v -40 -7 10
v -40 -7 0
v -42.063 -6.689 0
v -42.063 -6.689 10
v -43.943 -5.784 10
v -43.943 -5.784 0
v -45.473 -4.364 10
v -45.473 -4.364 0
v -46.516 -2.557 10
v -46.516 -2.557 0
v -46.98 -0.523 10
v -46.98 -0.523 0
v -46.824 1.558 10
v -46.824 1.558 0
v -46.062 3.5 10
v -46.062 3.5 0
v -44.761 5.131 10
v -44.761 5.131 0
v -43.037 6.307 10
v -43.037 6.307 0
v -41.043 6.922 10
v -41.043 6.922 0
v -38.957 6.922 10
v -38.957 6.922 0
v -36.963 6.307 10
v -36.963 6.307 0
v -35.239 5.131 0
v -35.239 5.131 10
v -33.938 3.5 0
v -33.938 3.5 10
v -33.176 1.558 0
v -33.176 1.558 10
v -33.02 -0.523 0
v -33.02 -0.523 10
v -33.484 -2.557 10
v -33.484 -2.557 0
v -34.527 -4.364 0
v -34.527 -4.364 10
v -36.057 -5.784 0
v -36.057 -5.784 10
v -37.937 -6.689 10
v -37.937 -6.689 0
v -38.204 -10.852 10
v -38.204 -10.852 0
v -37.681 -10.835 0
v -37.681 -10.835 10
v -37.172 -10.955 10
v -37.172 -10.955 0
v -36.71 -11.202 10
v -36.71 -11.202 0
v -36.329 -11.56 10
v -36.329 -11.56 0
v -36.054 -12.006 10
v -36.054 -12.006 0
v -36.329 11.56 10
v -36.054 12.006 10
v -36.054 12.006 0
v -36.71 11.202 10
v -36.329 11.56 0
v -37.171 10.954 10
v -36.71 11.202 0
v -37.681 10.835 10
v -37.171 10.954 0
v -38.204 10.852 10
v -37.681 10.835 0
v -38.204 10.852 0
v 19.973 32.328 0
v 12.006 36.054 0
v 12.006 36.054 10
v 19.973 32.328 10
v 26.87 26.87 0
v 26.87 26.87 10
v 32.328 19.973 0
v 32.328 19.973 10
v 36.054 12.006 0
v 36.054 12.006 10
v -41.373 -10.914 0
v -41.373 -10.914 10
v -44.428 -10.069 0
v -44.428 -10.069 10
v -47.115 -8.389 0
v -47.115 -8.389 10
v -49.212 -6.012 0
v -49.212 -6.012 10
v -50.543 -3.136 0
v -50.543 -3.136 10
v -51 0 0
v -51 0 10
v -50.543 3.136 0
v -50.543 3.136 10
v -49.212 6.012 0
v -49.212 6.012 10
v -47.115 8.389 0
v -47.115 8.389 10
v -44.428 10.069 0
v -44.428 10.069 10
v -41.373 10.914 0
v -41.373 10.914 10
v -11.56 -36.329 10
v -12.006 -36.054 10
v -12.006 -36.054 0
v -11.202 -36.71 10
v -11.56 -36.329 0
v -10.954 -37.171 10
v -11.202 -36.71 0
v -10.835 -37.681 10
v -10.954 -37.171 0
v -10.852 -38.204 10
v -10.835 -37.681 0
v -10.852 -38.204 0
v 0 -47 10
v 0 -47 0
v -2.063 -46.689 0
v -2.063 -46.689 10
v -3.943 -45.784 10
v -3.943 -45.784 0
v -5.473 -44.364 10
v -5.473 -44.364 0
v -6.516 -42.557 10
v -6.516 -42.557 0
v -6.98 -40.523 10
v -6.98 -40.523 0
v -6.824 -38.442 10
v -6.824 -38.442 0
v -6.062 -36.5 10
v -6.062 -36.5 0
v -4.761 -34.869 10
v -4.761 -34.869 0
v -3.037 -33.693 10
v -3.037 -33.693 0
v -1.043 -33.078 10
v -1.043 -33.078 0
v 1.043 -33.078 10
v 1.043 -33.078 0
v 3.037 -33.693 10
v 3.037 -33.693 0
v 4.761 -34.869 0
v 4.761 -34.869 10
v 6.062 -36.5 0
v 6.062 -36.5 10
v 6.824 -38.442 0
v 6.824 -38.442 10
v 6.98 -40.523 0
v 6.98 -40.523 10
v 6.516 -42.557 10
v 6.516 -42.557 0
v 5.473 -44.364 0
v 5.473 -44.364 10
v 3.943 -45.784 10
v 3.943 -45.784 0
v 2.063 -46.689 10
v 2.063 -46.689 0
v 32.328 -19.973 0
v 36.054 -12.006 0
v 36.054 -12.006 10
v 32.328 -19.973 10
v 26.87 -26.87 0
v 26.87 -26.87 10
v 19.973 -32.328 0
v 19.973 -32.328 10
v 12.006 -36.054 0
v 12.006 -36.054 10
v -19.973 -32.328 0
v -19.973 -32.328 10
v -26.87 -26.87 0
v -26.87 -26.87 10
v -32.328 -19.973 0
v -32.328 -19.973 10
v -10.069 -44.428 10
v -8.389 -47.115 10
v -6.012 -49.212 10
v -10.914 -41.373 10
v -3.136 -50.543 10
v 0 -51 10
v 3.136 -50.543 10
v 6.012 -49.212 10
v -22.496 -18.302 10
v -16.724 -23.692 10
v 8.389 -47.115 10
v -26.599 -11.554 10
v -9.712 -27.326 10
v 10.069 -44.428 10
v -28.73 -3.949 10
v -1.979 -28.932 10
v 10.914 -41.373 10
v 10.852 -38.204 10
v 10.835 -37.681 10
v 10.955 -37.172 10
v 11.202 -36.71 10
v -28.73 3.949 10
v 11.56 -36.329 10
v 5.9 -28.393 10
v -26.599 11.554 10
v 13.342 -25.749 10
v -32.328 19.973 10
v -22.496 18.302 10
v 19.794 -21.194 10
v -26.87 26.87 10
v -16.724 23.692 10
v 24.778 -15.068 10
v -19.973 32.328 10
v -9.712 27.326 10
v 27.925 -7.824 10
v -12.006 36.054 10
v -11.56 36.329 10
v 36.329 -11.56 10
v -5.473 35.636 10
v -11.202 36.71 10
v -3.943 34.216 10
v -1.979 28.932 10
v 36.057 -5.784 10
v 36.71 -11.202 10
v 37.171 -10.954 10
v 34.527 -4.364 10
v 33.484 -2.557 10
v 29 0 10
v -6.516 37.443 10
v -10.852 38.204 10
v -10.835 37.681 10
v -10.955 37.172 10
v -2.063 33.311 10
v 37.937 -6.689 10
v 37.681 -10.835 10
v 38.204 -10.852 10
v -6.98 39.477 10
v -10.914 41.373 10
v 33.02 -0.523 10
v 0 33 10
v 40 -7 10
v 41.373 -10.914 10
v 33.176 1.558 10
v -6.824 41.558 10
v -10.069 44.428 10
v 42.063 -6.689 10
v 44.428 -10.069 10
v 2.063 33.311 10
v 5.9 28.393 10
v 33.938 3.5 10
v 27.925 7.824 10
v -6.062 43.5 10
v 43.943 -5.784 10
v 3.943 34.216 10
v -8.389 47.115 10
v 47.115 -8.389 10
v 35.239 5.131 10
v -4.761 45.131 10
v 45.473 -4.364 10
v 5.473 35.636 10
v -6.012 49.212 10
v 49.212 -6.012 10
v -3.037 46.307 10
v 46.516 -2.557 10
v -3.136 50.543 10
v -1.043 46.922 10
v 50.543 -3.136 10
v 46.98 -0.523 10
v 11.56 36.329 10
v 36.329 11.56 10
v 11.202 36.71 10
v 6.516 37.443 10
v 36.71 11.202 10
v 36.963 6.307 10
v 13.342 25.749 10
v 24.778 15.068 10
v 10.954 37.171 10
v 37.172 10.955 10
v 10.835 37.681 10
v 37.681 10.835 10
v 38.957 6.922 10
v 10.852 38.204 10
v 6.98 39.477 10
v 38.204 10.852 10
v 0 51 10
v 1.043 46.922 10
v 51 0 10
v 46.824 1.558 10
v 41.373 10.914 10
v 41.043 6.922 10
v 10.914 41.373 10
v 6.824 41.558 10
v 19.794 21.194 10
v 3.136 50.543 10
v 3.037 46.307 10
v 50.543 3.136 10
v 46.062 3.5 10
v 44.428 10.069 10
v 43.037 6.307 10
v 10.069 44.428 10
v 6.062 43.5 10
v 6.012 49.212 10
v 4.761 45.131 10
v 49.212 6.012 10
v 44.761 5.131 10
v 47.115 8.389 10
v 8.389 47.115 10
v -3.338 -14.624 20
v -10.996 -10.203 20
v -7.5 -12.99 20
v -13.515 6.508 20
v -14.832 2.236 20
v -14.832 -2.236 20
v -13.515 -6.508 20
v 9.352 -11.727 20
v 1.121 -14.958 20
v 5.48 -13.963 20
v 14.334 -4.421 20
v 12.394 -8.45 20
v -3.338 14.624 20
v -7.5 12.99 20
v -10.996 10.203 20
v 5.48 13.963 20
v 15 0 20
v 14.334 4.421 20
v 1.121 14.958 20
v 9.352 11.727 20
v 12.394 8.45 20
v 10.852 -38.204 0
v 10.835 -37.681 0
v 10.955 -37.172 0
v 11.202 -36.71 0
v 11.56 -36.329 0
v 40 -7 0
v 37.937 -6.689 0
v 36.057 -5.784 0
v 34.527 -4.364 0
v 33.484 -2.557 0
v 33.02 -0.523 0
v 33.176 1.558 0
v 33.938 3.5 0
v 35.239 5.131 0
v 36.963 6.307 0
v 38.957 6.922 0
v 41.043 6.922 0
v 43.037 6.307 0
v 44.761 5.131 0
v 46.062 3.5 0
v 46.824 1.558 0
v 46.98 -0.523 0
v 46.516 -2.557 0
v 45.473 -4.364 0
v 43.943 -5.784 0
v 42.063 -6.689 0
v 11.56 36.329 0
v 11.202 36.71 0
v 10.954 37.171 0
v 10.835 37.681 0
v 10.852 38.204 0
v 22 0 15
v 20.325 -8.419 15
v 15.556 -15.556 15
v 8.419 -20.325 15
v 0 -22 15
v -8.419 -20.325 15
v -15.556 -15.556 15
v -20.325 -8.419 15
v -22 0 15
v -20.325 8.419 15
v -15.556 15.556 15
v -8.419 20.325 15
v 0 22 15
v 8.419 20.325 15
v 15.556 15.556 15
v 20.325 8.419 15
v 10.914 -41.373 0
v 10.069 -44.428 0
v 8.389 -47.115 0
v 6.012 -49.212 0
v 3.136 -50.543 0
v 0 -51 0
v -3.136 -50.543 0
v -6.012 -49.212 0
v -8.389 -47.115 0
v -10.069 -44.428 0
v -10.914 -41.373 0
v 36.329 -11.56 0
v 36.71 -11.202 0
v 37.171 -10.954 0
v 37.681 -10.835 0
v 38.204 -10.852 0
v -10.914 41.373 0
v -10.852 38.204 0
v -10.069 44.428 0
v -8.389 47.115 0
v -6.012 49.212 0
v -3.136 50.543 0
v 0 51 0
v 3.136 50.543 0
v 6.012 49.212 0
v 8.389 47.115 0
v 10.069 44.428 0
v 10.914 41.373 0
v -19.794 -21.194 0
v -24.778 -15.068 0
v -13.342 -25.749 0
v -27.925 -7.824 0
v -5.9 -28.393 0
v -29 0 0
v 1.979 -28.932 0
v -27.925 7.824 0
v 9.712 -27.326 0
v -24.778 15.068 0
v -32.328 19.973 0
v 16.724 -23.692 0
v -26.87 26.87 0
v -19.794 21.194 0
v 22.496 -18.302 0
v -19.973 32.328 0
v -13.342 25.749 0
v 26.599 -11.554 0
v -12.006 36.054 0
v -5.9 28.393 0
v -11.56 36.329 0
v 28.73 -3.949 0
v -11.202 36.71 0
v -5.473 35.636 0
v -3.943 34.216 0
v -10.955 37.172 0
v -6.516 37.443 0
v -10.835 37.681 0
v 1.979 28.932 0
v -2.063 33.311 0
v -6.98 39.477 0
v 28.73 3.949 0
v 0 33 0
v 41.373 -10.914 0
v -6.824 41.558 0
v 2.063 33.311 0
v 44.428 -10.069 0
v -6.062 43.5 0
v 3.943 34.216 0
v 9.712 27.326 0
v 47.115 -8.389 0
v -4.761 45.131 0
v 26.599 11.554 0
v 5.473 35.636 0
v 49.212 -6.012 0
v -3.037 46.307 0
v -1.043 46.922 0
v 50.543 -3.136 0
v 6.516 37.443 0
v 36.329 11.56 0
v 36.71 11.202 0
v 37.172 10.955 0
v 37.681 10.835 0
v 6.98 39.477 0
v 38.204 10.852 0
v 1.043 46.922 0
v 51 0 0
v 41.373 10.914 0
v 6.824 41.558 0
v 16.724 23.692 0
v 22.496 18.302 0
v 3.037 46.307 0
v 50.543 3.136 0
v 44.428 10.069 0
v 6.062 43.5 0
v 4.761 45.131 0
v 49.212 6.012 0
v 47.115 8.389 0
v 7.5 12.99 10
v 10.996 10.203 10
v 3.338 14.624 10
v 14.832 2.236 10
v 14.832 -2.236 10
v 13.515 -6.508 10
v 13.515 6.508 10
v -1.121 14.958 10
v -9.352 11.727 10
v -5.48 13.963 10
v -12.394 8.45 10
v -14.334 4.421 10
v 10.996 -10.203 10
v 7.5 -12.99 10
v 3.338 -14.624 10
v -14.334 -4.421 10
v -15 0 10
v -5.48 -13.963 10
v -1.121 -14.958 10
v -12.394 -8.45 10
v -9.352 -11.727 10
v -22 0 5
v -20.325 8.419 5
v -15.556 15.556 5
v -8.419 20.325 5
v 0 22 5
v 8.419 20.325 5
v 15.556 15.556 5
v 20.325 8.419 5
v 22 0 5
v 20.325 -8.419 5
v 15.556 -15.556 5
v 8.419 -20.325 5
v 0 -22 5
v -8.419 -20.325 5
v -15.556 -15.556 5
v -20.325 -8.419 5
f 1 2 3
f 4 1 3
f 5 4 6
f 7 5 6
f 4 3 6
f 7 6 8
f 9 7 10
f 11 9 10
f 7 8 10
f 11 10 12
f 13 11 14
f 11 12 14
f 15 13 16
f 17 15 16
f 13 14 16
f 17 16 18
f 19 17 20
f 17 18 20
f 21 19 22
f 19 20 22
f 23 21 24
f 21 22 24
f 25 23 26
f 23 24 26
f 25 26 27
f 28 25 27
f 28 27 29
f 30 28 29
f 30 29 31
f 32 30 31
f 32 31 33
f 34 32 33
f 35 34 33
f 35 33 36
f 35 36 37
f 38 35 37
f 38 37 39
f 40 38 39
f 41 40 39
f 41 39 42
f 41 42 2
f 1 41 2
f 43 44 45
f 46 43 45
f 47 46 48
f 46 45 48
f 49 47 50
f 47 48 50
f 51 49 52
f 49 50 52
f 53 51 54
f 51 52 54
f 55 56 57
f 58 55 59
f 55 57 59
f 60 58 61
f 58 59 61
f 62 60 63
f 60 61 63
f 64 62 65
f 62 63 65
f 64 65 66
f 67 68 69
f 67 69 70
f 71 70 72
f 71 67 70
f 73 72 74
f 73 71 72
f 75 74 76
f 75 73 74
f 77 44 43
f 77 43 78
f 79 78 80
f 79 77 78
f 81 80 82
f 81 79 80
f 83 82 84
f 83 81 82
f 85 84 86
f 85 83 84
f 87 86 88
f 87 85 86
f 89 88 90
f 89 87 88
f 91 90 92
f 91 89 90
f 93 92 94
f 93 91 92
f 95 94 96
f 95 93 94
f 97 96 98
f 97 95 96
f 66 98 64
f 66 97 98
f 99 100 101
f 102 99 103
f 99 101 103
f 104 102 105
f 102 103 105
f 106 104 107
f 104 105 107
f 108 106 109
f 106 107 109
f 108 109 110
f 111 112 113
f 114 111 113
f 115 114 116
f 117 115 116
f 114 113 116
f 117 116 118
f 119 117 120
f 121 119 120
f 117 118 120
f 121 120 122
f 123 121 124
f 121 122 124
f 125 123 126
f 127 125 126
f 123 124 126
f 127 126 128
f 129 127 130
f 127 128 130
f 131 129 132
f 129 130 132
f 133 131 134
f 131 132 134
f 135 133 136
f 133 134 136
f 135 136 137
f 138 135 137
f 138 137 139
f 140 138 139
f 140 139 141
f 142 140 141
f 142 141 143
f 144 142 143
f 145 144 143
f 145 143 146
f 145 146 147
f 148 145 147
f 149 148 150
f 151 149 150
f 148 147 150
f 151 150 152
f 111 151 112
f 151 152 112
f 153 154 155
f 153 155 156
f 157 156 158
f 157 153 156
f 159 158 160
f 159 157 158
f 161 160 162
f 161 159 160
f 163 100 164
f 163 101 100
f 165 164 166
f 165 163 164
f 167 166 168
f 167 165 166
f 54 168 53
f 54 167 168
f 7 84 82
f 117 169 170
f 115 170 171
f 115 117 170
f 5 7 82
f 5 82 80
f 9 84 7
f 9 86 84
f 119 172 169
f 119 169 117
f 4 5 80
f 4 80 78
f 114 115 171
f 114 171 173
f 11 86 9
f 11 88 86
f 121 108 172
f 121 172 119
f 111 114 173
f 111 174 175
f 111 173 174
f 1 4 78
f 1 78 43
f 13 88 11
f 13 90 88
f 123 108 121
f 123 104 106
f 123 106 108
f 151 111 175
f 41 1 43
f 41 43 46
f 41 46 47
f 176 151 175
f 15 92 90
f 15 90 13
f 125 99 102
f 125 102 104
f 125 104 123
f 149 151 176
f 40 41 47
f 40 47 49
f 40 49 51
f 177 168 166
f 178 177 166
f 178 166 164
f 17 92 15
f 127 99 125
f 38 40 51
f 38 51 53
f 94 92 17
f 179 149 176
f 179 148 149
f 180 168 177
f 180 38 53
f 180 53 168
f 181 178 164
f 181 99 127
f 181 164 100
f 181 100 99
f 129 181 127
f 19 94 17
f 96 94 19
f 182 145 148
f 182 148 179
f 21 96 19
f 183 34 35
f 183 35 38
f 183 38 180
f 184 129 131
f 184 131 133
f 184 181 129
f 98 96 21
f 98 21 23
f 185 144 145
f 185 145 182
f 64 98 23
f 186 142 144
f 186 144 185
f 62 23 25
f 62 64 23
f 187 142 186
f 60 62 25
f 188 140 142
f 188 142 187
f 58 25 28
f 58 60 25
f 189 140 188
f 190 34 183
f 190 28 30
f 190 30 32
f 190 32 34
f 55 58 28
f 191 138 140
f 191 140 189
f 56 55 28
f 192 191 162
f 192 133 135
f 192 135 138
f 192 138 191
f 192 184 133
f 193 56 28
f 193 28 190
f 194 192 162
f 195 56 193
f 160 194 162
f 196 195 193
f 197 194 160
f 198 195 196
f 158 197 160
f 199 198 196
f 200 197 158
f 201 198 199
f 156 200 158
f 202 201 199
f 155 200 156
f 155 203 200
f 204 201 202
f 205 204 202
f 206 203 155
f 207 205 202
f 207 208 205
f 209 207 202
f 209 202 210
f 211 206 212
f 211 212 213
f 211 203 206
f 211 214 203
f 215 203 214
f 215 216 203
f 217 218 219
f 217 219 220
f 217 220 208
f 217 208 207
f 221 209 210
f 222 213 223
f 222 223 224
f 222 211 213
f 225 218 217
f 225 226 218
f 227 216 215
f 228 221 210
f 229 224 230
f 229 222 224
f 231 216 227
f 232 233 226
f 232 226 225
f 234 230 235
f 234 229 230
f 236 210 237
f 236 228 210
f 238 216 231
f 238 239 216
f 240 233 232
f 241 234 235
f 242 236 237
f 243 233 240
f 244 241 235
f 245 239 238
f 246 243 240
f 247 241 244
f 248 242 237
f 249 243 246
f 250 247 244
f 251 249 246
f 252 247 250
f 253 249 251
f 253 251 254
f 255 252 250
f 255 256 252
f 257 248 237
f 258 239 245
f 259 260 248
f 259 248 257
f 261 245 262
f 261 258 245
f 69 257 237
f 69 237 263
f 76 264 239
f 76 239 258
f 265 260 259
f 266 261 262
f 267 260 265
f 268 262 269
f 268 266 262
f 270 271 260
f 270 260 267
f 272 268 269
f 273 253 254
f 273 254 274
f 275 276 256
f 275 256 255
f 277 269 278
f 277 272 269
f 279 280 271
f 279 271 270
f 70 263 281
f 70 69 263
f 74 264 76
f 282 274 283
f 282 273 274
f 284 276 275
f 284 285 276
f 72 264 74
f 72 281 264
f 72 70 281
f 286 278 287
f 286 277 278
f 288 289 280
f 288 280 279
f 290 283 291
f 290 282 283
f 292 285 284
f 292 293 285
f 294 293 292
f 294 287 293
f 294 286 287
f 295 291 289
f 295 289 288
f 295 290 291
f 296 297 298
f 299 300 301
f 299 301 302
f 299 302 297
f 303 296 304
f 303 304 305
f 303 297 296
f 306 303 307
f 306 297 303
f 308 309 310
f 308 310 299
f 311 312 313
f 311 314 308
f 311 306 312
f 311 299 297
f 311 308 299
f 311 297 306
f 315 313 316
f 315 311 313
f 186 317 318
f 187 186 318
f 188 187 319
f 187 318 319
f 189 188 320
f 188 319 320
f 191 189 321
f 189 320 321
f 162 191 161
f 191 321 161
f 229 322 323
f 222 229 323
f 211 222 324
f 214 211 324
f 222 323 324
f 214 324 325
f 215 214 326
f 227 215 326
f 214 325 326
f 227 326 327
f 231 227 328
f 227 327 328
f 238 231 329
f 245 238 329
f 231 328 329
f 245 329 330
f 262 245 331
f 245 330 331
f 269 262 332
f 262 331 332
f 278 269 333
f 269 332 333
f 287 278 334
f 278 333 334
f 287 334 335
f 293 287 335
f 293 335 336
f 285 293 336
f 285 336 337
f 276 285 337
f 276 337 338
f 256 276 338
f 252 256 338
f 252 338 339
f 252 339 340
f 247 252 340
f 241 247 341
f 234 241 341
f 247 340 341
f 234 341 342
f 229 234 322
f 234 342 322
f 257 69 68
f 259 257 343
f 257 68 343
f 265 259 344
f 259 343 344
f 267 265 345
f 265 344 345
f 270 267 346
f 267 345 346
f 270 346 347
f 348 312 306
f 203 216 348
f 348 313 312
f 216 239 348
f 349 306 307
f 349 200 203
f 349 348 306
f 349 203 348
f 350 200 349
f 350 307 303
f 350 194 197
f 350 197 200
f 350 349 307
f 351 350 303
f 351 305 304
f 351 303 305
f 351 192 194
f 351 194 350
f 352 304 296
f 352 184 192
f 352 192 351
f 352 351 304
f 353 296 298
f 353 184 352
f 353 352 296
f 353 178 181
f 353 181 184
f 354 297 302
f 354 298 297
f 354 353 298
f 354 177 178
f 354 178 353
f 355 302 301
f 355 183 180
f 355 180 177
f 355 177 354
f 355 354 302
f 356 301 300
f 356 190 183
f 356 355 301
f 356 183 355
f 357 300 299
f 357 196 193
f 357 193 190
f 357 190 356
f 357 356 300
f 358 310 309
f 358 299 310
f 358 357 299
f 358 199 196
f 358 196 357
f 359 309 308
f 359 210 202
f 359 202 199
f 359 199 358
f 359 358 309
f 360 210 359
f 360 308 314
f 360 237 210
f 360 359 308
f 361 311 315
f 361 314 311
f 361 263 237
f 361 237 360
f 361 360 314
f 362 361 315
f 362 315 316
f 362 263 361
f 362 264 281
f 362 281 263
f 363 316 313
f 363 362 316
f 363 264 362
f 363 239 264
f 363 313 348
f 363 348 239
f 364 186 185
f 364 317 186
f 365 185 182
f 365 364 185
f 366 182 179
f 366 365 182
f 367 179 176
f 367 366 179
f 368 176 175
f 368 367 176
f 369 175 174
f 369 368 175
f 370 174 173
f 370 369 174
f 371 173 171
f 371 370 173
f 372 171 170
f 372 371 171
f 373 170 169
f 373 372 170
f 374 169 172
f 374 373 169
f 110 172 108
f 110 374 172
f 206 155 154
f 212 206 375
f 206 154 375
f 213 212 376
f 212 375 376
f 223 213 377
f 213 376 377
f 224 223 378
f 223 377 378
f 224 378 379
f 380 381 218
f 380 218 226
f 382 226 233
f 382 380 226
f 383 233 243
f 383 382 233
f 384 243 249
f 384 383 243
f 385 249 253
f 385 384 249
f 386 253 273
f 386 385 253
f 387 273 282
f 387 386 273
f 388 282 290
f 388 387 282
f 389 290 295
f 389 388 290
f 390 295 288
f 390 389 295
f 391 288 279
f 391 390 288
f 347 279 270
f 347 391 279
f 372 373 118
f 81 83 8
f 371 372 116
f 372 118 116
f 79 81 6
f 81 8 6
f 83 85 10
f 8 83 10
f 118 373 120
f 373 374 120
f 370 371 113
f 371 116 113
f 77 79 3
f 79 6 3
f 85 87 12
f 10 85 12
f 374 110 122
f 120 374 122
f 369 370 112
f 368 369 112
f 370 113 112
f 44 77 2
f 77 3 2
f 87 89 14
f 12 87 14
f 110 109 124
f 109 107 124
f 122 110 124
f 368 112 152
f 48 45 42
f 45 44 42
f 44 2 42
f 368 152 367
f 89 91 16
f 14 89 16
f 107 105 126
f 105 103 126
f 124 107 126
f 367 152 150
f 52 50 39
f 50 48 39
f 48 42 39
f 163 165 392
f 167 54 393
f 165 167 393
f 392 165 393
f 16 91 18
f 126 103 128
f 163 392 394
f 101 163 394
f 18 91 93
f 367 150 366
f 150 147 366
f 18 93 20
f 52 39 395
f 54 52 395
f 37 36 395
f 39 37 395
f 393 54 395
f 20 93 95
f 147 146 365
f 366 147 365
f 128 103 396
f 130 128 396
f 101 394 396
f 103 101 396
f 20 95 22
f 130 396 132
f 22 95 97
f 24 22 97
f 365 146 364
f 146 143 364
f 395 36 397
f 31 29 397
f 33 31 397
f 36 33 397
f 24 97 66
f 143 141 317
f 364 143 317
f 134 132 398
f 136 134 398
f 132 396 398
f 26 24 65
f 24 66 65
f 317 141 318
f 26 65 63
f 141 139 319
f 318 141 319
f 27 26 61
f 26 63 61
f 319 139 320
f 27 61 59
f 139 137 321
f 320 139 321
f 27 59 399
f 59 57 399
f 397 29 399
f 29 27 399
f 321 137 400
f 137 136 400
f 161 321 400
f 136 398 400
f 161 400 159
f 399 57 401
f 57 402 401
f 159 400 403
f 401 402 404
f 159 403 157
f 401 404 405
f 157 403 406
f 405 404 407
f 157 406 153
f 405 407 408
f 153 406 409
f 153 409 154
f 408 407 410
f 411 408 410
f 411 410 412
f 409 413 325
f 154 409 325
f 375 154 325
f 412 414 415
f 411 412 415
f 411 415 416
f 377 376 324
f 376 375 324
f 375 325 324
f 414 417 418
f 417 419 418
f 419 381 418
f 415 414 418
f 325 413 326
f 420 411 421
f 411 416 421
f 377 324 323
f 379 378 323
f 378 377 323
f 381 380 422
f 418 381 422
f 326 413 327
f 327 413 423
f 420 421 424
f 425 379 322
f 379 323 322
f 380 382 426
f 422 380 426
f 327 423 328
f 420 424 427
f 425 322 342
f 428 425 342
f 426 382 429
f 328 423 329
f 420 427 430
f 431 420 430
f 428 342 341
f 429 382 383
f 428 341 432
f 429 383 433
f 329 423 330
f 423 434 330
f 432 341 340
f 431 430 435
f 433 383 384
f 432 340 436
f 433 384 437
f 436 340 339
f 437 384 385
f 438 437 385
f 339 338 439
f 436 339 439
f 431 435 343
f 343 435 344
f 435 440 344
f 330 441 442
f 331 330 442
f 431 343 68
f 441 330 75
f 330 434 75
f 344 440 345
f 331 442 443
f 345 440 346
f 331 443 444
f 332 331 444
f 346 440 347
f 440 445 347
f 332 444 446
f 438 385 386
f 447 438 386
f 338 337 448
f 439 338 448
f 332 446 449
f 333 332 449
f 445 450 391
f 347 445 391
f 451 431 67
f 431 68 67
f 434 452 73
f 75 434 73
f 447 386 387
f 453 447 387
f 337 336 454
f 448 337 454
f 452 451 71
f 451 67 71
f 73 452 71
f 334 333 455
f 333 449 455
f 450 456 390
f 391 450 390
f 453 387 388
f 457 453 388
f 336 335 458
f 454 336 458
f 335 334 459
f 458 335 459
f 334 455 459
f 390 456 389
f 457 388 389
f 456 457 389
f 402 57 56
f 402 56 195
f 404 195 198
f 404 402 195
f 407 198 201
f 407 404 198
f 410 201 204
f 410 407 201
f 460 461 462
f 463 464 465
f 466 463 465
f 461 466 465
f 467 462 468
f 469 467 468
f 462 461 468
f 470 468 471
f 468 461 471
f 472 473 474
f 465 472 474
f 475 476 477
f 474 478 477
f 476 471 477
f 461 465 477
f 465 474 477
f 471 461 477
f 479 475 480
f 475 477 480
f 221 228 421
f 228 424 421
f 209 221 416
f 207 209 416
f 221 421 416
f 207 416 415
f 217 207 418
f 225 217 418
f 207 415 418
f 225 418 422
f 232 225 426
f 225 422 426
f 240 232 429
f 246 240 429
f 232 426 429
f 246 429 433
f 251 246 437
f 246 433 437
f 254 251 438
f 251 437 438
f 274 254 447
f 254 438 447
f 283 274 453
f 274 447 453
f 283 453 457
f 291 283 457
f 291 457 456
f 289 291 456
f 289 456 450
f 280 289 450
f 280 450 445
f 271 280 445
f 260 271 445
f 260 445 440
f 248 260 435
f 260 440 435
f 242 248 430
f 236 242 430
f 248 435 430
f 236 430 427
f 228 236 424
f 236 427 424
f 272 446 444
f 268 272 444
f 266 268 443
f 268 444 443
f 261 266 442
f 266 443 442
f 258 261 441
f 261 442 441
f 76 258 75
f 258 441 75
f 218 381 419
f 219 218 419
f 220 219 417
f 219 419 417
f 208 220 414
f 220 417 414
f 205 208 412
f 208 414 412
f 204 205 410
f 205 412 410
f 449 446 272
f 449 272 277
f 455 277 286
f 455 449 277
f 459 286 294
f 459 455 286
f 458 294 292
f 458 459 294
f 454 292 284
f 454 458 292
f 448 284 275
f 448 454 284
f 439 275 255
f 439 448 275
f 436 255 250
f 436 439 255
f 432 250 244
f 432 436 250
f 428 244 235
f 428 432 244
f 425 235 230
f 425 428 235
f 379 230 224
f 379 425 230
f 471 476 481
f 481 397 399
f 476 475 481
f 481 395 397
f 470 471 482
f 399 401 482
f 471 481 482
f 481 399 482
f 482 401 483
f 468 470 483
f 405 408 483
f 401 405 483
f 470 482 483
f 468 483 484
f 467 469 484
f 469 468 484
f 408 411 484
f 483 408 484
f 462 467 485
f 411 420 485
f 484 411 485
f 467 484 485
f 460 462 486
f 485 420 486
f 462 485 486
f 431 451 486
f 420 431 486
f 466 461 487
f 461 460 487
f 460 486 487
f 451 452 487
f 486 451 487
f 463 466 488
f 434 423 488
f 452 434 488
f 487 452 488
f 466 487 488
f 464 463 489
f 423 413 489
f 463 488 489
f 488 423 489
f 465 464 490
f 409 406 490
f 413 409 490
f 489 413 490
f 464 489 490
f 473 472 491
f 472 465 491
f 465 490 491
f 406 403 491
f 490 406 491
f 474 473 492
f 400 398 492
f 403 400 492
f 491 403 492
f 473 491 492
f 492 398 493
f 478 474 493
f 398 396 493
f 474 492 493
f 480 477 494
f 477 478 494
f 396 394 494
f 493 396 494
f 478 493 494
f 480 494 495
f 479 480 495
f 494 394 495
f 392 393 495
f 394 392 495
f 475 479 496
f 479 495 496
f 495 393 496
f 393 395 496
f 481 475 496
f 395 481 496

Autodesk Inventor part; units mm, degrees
ref_plane "YZ Plane" through (0, 0, 0) normal (1, 0, 0) x (0, 1, 0)
ref_plane "XZ Plane" through (0, 0, 0) normal (0, 1, 0) x (-1, 0, 0)
ref_plane "XY Plane" through (0, 0, 0) normal (0, 0, 1) x (1, 0, 0)
sketch "Эскиз1" plane through (0, 0, 0) normal (0, 0, 1) x (1, 0, 0)
  arc A0 (-38.2043, 10.8524) -> (-38.2043, -10.8524) centre (-40, 0) ccw
  arc A1 (-10.8524, -38.2043) -> (10.8524, -38.2043) centre (0, -40) ccw
  arc A2 (10.8524, 38.2043) -> (-10.8524, 38.2043) centre (0, 40) ccw
  arc A3 (38.2043, -10.8524) -> (38.2043, 10.8524) centre (40, 0) ccw
  arc A4 (-38.2043, 10.8524) -> (-36.0537, 12.0056) centre (-37.8778, 12.8256) ccw
  arc A5 (-36.0537, -12.0056) -> (-38.2043, -10.8524) centre (-37.8778, -12.8256) ccw
  arc A6 (-10.8524, -38.2043) -> (-12.0056, -36.0537) centre (-12.8256, -37.8778) ccw
  arc A7 (12.0056, -36.0537) -> (10.8524, -38.2043) centre (12.8256, -37.8778) ccw
  arc A8 (38.2043, -10.8524) -> (36.0537, -12.0056) centre (37.8778, -12.8256) ccw
  arc A9 (36.0537, 12.0056) -> (38.2043, 10.8524) centre (37.8778, 12.8256) ccw
  arc A10 (10.8524, 38.2043) -> (12.0056, 36.0537) centre (12.8256, 37.8778) ccw
  arc A11 (-12.0056, 36.0537) -> (-10.8524, 38.2043) centre (-12.8256, 37.8778) ccw
  arc A12 (-12.0056, 36.0537) -> (-36.0537, 12.0056) centre (0, 0) ccw
  arc A13 (36.0537, 12.0056) -> (12.0056, 36.0537) centre (0, 0) ccw
  arc A14 (-36.0537, -12.0056) -> (-12.0056, -36.0537) centre (0, 0) ccw
  arc A15 (12.0056, -36.0537) -> (36.0537, -12.0056) centre (0, 0) ccw
  dimension "d87" = 22
  dimension "d88" = 22
  dimension "d89" = 22
  dimension "d90" = 22
  dimension "d91" = 40
  dimension "d92" = 40
  dimension "d93" = 40
  dimension "d94" = 40
  dimension "d95" = 4
  dimension "d96" = 4
  dimension "d97" = 4
  dimension "d98" = 4
  dimension "d99" = 4
  dimension "d100" = 4
  dimension "d101" = 4
  dimension "d102" = 4
  dimension "d103" = 38
  dimension "d104" = 38
  dimension "d105" = 38
  dimension "d106" = 38
  dimension "d107" = 37.8778
  dimension "d108" = 37.8778
  dimension "d109" = 37.8778
  dimension "d110" = 37.8778
  dimension "d111" = 37.8778
  dimension "d112" = 37.8778
  dimension "d113" = 37.8778
  dimension "d114" = 37.8778
extrude "Выдавливание1" add sketch "Эскиз1" along normal blind 20
sketch "Эскиз4" plane through (0, 0, 0) normal (0, 1, 0) x (-1, 0, 0)
  line L0 (0, 0) -> (29, 0)
  line L1 (0, 10) -> (15, 10)
  line L2 (15, 10) -> (29, 0)
  line L3 (0, 10) -> (0, 0)
  line L4 (11, 0) -> (-11, 0) projected
  line L5 (0, -4) -> (0, 24) projected
  point P0 (10.8524, 0)
  point P1 (-10.8524, 0)
  dimension "d115" = 29
  dimension "d116" = 15
  dimension "d117" = 10
revolve "Вращение4" cut sketch "Эскиз4" angle 360 about axis through (0, 0, -10) along (0, 0, 1)
sketch "Эскиз5" plane through (0, 0, 0) normal (0, 1, 0) x (-1, 0, 0)
  line L0 (-51, 0) -> (-51, 20) projected
  line L1 (-51, 10) -> (-29, 10)
  line L2 (-29, 10) -> (-15, 20)
  line L3 (-15, 20) -> (-51, 20)
  line L4 (-12.0056, 20) -> (-36.0537, 20) projected
  line L5 (-15, 10) -> (-29, 0) projected
  line L6 (-38.2043, 0) -> (-51, 0) projected
  line L7 (0, -4) -> (0, 24) projected
  point P0 (0, 0)
  dimension "d120" = 10
  dimension "d122" = 29
revolve "Вращение5" cut sketch "Эскиз5" angle 360 about axis through (0, 0, -10) along (0, 0, 1)
sketch "Эскиз6" plane through (0, -40, 10) normal (0, 0, 1) x (1, 0, 0)
  circle A0 centre (0, 0) radius 7
  circle A1 centre (-40, 40) radius 7
  circle A2 centre (0, 80) radius 7
  circle A3 centre (40, 40) radius 7
  point P0 (0, 40)
  dimension "d125" = 40
  dimension "d126" = 40
  dimension "d127" = 40
  dimension "d128" = 40
  dimension "d129" = 14
  dimension "d130" = 14
  dimension "d131" = 14
  dimension "d132" = 14
hole "Отверстие1" at (0, -40, 10) at (-40, 0, 10) at (40, 0, 10) at (0, 40, 10) direction (0, 0, -1) diameter 14 depth 10
